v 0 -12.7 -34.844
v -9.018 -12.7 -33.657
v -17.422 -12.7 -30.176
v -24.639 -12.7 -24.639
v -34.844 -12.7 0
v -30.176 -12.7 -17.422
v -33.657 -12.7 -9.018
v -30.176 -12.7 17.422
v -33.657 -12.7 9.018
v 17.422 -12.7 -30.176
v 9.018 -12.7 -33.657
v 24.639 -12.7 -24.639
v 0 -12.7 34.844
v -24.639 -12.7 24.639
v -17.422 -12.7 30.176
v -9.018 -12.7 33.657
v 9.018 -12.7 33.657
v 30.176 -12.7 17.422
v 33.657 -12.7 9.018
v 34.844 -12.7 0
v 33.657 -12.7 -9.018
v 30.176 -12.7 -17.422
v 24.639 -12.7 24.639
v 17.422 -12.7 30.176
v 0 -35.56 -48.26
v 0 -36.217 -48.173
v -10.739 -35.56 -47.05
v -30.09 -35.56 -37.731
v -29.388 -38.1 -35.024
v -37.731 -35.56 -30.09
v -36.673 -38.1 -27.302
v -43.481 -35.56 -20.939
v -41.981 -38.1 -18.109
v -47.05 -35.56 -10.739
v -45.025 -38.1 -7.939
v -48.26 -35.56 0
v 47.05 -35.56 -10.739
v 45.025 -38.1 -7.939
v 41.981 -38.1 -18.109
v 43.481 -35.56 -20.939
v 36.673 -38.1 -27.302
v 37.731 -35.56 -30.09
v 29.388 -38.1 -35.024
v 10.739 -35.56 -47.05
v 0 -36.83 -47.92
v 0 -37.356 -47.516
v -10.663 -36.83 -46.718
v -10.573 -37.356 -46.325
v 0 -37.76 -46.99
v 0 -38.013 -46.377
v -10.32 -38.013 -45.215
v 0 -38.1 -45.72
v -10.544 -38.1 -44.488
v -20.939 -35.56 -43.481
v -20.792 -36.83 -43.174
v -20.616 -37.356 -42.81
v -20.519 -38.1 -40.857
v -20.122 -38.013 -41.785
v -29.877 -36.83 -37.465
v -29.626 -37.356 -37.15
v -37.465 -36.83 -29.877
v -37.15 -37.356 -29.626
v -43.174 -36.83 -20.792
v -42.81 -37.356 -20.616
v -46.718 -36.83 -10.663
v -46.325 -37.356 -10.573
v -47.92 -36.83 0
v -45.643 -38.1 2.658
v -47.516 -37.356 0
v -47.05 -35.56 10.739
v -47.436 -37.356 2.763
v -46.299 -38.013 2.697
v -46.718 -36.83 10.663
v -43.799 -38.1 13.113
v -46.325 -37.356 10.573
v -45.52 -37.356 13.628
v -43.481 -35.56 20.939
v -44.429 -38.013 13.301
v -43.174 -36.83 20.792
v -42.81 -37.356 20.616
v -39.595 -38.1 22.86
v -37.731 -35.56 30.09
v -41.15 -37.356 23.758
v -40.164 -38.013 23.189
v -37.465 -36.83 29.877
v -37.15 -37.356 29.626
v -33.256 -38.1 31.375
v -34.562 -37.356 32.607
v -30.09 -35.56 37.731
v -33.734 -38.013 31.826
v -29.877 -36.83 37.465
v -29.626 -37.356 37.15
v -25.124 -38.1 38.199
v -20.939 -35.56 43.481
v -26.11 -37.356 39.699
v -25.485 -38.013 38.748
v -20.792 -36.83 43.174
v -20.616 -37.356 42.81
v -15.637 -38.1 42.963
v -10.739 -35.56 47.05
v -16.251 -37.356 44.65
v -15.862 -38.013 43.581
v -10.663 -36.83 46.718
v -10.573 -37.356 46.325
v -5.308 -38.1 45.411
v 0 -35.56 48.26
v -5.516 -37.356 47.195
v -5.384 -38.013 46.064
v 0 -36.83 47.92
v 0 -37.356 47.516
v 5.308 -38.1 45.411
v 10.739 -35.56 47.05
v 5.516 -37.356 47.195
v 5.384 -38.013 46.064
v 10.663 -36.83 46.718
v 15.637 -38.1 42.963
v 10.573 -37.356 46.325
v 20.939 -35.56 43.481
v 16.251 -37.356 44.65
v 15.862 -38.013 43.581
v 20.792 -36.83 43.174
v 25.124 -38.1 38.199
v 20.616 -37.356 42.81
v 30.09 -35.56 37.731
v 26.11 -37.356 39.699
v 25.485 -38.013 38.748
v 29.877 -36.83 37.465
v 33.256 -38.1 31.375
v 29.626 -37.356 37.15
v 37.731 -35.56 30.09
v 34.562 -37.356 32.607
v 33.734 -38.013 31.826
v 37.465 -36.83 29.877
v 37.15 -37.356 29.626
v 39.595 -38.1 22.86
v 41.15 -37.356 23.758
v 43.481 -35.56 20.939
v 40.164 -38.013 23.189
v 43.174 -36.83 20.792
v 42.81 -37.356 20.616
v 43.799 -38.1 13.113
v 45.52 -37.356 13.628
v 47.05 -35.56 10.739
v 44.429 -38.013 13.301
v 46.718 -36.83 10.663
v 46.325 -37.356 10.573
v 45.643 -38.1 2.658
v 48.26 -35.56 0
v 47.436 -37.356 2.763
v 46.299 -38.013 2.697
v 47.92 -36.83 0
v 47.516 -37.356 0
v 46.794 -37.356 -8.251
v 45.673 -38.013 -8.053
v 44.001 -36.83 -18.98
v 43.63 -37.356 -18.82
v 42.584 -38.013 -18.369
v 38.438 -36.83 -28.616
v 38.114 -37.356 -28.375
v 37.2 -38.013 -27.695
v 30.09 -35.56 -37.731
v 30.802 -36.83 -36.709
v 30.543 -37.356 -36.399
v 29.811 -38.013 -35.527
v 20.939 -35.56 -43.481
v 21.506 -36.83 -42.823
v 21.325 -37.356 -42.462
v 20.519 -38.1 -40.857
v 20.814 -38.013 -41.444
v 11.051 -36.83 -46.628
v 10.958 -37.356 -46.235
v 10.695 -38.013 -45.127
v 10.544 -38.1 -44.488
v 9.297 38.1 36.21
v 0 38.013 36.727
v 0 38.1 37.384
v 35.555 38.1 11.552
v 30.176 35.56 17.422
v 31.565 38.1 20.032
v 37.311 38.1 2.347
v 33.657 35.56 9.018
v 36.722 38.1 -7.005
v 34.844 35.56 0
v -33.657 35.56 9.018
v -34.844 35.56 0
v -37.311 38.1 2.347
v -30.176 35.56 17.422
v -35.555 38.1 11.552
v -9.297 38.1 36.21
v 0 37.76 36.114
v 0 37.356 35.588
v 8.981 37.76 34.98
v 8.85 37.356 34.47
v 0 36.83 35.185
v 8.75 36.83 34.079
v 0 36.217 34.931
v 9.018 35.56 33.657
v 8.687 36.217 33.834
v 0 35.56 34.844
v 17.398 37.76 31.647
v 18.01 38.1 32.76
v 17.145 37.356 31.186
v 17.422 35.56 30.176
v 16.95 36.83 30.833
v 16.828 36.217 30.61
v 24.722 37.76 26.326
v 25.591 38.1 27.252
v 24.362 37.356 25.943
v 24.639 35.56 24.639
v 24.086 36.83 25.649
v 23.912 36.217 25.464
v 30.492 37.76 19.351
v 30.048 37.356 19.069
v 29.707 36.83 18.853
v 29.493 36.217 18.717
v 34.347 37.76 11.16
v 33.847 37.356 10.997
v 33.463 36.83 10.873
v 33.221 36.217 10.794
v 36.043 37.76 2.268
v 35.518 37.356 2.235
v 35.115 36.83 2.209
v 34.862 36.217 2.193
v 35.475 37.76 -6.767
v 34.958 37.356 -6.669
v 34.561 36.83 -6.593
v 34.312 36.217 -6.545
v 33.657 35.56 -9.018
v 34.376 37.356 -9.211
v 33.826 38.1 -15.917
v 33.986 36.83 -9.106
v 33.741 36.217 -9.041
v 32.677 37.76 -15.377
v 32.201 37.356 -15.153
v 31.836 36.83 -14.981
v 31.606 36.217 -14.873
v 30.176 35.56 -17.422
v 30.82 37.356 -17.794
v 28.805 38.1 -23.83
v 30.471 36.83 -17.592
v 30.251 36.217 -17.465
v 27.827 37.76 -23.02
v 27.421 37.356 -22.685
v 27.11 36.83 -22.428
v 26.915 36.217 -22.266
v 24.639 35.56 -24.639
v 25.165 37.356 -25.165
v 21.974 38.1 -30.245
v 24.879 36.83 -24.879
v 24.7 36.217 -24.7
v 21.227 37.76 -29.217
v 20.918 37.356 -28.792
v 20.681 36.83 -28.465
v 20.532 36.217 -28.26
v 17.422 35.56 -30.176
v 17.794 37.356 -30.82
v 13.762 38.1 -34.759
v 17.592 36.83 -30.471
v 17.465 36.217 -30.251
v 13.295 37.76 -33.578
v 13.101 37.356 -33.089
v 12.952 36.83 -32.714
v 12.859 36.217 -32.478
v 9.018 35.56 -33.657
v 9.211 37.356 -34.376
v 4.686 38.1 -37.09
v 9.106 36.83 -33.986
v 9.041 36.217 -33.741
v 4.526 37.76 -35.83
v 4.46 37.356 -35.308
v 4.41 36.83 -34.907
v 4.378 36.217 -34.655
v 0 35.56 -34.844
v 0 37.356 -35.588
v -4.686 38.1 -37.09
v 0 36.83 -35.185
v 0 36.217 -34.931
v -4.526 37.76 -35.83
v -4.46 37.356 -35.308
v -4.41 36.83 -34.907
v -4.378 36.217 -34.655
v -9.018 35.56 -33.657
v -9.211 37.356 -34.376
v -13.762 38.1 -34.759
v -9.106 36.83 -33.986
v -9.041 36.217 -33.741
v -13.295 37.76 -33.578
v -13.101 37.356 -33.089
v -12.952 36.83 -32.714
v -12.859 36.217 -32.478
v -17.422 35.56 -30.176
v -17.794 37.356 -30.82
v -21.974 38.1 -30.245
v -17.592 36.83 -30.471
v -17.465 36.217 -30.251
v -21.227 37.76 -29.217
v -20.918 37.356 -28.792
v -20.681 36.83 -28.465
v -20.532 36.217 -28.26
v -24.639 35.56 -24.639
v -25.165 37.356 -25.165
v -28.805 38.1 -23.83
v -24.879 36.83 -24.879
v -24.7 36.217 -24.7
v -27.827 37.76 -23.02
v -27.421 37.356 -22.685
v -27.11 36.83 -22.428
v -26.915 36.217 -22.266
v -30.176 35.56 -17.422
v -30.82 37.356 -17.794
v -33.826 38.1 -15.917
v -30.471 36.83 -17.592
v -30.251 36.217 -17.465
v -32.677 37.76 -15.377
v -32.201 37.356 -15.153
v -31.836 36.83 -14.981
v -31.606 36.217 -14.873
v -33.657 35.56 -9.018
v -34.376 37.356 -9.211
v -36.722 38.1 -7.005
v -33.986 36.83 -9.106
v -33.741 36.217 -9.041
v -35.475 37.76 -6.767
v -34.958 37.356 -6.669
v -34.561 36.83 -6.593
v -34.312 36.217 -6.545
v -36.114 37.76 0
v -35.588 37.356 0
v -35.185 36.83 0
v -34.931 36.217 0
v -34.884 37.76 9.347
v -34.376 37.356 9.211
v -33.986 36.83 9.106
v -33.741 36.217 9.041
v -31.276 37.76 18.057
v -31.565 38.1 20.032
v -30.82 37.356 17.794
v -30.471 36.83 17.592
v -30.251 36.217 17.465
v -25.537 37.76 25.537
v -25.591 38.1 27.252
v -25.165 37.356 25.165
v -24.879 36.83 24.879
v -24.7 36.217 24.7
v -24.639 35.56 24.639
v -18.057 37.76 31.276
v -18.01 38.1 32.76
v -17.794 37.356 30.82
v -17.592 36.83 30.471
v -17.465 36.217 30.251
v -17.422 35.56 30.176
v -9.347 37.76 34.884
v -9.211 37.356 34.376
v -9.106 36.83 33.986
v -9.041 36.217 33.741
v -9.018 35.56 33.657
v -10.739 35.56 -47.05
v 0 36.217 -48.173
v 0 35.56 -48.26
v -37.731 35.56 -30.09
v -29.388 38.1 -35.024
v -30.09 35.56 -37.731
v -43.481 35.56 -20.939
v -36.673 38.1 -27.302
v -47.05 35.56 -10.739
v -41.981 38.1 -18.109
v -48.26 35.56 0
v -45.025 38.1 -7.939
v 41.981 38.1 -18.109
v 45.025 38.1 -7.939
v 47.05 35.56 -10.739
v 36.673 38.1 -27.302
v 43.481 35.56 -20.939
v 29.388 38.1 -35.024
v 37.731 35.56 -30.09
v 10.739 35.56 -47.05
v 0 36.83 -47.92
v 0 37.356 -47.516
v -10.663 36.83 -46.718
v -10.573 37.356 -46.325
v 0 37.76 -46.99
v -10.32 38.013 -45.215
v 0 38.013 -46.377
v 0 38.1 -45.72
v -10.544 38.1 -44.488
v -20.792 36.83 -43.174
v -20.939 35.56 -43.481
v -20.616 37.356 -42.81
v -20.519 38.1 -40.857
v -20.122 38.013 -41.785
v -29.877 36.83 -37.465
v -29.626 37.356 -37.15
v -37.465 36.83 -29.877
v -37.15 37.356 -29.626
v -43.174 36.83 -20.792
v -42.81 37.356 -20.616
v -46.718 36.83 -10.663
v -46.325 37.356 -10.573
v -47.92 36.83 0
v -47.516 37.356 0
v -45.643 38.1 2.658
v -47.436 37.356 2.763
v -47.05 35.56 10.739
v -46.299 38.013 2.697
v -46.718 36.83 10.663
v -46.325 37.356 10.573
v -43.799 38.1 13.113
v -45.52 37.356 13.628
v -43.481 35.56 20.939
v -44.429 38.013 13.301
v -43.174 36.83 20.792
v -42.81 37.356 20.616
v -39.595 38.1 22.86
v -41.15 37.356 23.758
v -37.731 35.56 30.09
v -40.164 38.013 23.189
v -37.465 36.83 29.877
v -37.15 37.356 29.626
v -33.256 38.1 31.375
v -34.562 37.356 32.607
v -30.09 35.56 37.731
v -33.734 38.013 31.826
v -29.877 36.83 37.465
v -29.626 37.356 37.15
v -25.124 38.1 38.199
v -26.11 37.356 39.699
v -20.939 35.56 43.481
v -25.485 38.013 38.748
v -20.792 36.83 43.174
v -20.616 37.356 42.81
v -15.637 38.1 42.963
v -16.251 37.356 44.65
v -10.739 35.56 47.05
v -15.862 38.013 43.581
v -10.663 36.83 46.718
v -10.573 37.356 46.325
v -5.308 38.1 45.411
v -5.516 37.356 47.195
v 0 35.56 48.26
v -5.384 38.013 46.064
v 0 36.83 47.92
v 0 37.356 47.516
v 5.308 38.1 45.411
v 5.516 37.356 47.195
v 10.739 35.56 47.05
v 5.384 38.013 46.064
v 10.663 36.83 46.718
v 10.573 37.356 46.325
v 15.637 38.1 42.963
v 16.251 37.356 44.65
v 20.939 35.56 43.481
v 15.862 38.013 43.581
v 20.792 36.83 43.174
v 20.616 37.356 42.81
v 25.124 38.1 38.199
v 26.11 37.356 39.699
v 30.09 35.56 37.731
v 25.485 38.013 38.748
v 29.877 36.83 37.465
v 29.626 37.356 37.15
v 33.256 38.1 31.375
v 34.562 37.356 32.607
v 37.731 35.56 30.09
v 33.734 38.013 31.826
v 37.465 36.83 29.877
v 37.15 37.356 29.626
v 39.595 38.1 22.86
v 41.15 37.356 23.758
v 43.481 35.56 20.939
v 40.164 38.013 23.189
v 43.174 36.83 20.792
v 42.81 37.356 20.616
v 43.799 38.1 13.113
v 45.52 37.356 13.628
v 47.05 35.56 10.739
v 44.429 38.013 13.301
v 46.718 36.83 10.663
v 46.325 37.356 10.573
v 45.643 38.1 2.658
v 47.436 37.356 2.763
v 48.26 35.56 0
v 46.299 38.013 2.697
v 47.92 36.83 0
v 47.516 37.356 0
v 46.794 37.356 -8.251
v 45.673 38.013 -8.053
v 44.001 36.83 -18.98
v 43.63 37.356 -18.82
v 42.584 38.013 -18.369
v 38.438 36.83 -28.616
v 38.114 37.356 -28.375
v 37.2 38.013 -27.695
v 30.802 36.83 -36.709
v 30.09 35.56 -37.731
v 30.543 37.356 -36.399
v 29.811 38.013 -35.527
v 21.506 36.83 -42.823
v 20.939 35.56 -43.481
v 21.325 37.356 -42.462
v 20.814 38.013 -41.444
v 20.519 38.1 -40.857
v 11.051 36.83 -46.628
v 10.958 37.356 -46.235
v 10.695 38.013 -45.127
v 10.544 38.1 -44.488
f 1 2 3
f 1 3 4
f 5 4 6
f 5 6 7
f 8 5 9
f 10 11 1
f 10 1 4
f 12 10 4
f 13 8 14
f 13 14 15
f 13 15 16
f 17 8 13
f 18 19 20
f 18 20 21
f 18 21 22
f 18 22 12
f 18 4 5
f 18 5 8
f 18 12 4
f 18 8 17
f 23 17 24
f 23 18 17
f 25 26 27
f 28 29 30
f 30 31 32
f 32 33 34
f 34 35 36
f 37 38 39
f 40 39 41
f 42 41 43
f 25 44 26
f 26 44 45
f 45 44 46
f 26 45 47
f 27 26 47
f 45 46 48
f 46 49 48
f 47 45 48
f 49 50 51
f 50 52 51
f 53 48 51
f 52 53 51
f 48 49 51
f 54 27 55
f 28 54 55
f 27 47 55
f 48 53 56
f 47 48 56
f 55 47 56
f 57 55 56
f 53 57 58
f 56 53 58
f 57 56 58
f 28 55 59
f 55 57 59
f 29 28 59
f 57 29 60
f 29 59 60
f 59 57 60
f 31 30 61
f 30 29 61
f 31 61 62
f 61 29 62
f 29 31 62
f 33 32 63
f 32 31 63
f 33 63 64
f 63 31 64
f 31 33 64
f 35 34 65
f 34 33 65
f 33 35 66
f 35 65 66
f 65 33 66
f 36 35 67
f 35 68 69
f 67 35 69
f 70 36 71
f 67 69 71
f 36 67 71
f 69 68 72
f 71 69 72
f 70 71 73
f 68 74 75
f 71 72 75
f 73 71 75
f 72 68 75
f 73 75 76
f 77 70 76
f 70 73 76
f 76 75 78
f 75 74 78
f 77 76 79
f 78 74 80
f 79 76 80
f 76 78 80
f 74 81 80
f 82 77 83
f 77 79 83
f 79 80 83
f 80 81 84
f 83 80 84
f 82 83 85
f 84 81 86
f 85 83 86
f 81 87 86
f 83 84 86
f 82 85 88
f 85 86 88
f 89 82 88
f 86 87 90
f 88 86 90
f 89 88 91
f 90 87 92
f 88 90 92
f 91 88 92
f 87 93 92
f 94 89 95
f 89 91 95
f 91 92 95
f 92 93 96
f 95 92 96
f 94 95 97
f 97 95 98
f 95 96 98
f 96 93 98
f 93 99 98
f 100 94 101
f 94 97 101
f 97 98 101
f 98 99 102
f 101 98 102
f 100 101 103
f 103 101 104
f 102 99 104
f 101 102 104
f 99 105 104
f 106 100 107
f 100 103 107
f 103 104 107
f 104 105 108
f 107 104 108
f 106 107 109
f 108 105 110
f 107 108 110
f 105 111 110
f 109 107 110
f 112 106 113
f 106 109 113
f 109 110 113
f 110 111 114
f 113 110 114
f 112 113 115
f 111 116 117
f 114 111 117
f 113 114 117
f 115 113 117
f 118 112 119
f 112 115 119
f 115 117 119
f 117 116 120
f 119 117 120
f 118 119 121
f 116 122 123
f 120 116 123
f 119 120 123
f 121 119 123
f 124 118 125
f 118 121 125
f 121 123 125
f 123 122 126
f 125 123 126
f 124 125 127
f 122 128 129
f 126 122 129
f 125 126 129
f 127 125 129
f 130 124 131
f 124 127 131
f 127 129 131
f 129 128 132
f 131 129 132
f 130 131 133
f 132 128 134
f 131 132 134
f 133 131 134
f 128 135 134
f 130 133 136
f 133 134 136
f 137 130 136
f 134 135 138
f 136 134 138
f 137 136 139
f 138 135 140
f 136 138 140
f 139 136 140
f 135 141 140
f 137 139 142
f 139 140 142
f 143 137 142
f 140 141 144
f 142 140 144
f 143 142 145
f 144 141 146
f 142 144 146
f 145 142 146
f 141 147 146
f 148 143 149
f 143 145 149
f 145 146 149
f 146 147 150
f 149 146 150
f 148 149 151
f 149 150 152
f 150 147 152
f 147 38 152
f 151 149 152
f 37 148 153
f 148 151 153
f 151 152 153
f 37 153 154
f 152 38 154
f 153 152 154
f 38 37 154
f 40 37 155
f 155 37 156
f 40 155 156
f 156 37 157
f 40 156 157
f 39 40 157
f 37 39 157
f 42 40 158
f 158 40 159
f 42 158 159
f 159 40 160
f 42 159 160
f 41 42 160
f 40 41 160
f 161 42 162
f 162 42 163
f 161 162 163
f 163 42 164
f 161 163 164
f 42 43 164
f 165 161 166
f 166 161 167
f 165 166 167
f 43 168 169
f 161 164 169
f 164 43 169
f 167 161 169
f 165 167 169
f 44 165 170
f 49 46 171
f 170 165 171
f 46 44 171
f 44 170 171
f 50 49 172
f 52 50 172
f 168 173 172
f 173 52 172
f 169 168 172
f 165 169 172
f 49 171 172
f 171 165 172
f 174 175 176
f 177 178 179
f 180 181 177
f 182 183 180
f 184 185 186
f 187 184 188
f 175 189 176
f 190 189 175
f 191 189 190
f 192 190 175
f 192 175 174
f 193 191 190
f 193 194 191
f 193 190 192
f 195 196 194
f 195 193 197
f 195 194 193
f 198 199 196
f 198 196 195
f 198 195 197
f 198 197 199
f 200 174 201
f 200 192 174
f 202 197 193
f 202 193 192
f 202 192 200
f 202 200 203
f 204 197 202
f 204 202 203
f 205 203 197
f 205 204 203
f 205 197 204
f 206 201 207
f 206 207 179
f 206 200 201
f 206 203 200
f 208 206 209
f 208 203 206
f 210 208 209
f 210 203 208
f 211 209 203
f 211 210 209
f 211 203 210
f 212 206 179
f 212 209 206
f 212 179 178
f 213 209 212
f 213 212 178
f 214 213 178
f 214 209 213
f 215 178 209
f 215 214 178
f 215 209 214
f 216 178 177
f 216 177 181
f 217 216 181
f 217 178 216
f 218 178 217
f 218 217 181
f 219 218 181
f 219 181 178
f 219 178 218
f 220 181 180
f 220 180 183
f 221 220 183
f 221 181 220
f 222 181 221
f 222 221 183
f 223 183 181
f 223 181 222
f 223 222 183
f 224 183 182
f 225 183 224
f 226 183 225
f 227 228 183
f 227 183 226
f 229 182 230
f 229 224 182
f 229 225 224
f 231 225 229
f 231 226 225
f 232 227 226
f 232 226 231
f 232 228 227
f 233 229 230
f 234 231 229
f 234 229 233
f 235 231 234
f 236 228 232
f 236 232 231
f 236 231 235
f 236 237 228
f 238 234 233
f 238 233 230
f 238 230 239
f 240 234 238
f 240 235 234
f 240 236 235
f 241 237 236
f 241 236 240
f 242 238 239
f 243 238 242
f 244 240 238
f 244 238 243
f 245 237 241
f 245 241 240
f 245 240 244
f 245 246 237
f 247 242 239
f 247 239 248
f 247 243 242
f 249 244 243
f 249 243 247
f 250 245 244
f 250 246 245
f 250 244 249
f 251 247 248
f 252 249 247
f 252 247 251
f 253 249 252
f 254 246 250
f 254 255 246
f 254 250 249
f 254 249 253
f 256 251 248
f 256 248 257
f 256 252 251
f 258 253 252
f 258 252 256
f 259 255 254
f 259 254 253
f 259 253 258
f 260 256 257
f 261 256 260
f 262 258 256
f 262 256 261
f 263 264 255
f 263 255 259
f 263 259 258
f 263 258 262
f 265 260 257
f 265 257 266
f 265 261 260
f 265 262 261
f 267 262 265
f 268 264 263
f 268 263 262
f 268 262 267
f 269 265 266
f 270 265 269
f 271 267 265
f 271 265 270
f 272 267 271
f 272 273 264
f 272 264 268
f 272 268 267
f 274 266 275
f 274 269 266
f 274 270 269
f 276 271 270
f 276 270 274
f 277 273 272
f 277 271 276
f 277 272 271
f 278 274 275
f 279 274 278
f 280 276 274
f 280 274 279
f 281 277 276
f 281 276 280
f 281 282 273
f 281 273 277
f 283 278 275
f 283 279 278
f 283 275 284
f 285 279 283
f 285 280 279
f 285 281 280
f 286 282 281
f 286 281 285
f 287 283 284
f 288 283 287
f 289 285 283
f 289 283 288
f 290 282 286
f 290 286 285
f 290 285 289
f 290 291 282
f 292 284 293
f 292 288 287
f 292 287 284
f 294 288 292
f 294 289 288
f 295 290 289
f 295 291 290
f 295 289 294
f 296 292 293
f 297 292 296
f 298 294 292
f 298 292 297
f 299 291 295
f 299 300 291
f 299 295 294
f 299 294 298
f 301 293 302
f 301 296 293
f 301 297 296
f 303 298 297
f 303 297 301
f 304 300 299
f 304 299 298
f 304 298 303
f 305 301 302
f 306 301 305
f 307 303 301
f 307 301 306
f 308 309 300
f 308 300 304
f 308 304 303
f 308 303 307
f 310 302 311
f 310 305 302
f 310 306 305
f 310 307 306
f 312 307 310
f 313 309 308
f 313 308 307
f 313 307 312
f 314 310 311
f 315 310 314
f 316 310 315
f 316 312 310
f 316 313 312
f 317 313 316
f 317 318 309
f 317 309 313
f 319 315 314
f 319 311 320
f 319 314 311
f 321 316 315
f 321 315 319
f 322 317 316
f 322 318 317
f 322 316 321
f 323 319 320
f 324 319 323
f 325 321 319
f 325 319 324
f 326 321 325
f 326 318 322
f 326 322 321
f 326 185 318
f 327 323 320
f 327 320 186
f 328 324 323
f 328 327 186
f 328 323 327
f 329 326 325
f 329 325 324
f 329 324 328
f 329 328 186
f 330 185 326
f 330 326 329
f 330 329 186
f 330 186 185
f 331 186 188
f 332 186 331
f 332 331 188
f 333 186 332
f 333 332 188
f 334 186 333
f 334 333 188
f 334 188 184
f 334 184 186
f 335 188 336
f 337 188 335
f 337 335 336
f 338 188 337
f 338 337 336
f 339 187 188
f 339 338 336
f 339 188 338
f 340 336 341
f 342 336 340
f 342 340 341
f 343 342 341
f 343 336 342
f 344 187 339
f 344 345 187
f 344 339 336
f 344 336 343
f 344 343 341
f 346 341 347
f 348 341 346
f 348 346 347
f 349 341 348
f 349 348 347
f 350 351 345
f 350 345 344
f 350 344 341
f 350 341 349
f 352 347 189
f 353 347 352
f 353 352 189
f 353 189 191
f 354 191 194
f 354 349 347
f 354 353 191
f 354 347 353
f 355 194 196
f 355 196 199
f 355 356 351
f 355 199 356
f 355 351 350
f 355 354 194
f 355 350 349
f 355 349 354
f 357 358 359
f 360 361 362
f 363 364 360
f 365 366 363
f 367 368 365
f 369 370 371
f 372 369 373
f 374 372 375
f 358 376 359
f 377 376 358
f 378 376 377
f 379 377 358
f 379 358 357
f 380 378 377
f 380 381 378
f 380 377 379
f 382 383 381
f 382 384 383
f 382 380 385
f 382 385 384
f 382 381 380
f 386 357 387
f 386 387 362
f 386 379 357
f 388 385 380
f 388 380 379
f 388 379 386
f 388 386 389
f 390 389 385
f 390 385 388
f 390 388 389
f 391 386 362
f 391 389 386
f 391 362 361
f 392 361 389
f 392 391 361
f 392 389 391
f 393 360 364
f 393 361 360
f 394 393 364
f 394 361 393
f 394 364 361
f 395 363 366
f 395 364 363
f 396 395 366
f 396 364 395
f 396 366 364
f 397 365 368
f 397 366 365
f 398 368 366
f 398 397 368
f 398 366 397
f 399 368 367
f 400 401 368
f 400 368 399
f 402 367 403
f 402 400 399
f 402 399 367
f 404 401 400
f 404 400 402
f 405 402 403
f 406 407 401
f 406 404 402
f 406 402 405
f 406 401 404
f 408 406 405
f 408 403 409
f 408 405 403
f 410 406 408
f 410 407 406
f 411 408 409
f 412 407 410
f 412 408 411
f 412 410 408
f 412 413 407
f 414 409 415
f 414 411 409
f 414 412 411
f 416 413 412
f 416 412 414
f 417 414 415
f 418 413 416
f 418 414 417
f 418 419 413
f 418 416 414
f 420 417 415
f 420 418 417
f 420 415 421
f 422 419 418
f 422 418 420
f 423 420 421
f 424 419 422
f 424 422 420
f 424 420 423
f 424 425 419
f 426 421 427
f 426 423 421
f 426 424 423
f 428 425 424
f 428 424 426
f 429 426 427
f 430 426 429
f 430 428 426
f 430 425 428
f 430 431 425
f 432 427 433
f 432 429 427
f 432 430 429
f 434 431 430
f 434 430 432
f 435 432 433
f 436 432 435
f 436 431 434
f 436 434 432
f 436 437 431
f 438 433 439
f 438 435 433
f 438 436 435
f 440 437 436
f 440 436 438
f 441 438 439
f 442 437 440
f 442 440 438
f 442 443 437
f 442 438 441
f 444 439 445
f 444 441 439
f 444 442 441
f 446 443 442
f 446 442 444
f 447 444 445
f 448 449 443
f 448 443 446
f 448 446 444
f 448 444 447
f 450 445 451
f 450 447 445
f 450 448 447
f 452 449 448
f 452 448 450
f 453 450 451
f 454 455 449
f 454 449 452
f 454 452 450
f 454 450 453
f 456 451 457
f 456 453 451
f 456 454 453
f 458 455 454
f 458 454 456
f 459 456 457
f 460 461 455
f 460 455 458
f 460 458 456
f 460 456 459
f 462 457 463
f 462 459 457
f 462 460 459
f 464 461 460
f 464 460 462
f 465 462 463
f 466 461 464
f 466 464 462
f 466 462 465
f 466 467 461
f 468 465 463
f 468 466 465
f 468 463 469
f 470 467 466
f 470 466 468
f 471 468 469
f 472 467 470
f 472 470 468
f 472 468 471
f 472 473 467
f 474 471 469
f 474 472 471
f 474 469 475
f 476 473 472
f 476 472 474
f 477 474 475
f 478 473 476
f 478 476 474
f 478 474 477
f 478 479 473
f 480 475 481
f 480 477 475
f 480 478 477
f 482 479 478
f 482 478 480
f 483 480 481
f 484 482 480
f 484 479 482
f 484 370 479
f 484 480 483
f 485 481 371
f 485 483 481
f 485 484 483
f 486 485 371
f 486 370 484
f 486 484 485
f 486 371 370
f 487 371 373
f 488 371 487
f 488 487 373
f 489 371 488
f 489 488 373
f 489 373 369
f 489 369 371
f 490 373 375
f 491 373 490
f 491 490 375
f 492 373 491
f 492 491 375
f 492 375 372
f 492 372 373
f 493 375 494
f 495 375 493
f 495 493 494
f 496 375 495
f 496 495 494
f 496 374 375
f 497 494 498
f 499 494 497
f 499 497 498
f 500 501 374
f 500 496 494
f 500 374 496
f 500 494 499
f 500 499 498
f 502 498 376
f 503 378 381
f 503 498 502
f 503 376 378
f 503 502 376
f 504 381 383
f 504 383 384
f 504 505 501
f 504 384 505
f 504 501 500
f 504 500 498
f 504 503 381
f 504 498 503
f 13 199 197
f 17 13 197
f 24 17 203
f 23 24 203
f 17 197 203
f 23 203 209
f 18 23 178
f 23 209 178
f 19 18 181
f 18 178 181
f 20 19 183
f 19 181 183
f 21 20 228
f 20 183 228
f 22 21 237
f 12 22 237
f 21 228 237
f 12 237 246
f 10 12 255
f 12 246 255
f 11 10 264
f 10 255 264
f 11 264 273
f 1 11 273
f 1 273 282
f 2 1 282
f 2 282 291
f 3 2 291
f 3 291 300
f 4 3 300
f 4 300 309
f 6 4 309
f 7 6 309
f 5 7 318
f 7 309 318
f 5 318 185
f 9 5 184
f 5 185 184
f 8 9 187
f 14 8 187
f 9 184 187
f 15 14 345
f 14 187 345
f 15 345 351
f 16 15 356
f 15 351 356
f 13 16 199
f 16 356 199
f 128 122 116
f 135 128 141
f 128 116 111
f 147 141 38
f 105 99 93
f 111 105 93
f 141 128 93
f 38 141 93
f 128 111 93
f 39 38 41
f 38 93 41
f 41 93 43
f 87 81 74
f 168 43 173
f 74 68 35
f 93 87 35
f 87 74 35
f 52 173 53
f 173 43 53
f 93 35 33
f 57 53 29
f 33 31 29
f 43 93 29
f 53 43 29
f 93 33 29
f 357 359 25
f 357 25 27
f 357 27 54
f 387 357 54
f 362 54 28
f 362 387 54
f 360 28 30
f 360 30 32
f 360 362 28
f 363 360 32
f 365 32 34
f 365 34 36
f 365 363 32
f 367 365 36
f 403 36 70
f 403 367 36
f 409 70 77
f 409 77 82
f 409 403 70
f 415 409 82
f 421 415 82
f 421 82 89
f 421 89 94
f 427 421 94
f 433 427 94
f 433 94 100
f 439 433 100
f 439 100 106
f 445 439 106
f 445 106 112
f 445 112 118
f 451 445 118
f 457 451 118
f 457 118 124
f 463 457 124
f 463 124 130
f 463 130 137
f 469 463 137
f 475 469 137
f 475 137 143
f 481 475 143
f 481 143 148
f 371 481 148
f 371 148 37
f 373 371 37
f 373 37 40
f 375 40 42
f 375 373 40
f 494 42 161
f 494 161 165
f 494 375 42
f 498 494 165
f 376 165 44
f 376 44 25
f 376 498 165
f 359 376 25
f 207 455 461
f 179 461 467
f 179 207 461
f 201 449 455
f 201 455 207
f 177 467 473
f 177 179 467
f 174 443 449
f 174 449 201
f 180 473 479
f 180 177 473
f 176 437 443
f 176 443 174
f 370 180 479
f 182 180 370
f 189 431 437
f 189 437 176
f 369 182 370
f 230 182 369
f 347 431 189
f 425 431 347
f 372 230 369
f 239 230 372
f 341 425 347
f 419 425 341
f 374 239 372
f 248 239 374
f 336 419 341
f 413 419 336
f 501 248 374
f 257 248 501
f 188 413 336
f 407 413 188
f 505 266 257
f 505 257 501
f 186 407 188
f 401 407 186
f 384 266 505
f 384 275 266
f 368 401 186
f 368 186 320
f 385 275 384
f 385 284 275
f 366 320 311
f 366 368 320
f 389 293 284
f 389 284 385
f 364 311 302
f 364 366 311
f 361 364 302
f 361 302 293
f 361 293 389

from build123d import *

# Parameters (mm, degrees)
SKETCH1_R           = 48.26
BOSS_EXTRUDE1_DEPTH = 38.1
SKETCH3_R           = 34.844372605
CUT_EXTRUDE2_DEPTH  = 50.8
FILLET1_R           = 2.54


with BuildPart() as part:
    # Sketch1 → Boss-Extrude1 (new, symmetric)
    with BuildSketch(Plane(origin=(0, 0, 0), x_dir=(1, 0, 0), z_dir=(0, 1, 0))):
        with Locations(Location((0, 0, 0), (0, 0, 90))):
            Circle(SKETCH1_R)
    extrude(amount=BOSS_EXTRUDE1_DEPTH, both=True)

    # Sketch3 → Cut-Extrude2 (cut)
    with BuildSketch(Plane(origin=(0, 38.1, 0), x_dir=(1, 0, 0), z_dir=(0, 1, 0))):
        with Locations(Location((0, 0, 0), (0, 0, 270))):
            Circle(SKETCH3_R)
    extrude(amount=-CUT_EXTRUDE2_DEPTH, mode=Mode.SUBTRACT)

    # Fillet1
    fillet1_edges = [part.edges().sort_by_distance(p)[0] for p in [
        (0, -38.1, 48.26),
        (0, 38.1, 48.26),
        (0, 38.1, -34.844372605),
    ]]
    fillet(fillet1_edges, radius=FILLET1_R)


solid = part.part
